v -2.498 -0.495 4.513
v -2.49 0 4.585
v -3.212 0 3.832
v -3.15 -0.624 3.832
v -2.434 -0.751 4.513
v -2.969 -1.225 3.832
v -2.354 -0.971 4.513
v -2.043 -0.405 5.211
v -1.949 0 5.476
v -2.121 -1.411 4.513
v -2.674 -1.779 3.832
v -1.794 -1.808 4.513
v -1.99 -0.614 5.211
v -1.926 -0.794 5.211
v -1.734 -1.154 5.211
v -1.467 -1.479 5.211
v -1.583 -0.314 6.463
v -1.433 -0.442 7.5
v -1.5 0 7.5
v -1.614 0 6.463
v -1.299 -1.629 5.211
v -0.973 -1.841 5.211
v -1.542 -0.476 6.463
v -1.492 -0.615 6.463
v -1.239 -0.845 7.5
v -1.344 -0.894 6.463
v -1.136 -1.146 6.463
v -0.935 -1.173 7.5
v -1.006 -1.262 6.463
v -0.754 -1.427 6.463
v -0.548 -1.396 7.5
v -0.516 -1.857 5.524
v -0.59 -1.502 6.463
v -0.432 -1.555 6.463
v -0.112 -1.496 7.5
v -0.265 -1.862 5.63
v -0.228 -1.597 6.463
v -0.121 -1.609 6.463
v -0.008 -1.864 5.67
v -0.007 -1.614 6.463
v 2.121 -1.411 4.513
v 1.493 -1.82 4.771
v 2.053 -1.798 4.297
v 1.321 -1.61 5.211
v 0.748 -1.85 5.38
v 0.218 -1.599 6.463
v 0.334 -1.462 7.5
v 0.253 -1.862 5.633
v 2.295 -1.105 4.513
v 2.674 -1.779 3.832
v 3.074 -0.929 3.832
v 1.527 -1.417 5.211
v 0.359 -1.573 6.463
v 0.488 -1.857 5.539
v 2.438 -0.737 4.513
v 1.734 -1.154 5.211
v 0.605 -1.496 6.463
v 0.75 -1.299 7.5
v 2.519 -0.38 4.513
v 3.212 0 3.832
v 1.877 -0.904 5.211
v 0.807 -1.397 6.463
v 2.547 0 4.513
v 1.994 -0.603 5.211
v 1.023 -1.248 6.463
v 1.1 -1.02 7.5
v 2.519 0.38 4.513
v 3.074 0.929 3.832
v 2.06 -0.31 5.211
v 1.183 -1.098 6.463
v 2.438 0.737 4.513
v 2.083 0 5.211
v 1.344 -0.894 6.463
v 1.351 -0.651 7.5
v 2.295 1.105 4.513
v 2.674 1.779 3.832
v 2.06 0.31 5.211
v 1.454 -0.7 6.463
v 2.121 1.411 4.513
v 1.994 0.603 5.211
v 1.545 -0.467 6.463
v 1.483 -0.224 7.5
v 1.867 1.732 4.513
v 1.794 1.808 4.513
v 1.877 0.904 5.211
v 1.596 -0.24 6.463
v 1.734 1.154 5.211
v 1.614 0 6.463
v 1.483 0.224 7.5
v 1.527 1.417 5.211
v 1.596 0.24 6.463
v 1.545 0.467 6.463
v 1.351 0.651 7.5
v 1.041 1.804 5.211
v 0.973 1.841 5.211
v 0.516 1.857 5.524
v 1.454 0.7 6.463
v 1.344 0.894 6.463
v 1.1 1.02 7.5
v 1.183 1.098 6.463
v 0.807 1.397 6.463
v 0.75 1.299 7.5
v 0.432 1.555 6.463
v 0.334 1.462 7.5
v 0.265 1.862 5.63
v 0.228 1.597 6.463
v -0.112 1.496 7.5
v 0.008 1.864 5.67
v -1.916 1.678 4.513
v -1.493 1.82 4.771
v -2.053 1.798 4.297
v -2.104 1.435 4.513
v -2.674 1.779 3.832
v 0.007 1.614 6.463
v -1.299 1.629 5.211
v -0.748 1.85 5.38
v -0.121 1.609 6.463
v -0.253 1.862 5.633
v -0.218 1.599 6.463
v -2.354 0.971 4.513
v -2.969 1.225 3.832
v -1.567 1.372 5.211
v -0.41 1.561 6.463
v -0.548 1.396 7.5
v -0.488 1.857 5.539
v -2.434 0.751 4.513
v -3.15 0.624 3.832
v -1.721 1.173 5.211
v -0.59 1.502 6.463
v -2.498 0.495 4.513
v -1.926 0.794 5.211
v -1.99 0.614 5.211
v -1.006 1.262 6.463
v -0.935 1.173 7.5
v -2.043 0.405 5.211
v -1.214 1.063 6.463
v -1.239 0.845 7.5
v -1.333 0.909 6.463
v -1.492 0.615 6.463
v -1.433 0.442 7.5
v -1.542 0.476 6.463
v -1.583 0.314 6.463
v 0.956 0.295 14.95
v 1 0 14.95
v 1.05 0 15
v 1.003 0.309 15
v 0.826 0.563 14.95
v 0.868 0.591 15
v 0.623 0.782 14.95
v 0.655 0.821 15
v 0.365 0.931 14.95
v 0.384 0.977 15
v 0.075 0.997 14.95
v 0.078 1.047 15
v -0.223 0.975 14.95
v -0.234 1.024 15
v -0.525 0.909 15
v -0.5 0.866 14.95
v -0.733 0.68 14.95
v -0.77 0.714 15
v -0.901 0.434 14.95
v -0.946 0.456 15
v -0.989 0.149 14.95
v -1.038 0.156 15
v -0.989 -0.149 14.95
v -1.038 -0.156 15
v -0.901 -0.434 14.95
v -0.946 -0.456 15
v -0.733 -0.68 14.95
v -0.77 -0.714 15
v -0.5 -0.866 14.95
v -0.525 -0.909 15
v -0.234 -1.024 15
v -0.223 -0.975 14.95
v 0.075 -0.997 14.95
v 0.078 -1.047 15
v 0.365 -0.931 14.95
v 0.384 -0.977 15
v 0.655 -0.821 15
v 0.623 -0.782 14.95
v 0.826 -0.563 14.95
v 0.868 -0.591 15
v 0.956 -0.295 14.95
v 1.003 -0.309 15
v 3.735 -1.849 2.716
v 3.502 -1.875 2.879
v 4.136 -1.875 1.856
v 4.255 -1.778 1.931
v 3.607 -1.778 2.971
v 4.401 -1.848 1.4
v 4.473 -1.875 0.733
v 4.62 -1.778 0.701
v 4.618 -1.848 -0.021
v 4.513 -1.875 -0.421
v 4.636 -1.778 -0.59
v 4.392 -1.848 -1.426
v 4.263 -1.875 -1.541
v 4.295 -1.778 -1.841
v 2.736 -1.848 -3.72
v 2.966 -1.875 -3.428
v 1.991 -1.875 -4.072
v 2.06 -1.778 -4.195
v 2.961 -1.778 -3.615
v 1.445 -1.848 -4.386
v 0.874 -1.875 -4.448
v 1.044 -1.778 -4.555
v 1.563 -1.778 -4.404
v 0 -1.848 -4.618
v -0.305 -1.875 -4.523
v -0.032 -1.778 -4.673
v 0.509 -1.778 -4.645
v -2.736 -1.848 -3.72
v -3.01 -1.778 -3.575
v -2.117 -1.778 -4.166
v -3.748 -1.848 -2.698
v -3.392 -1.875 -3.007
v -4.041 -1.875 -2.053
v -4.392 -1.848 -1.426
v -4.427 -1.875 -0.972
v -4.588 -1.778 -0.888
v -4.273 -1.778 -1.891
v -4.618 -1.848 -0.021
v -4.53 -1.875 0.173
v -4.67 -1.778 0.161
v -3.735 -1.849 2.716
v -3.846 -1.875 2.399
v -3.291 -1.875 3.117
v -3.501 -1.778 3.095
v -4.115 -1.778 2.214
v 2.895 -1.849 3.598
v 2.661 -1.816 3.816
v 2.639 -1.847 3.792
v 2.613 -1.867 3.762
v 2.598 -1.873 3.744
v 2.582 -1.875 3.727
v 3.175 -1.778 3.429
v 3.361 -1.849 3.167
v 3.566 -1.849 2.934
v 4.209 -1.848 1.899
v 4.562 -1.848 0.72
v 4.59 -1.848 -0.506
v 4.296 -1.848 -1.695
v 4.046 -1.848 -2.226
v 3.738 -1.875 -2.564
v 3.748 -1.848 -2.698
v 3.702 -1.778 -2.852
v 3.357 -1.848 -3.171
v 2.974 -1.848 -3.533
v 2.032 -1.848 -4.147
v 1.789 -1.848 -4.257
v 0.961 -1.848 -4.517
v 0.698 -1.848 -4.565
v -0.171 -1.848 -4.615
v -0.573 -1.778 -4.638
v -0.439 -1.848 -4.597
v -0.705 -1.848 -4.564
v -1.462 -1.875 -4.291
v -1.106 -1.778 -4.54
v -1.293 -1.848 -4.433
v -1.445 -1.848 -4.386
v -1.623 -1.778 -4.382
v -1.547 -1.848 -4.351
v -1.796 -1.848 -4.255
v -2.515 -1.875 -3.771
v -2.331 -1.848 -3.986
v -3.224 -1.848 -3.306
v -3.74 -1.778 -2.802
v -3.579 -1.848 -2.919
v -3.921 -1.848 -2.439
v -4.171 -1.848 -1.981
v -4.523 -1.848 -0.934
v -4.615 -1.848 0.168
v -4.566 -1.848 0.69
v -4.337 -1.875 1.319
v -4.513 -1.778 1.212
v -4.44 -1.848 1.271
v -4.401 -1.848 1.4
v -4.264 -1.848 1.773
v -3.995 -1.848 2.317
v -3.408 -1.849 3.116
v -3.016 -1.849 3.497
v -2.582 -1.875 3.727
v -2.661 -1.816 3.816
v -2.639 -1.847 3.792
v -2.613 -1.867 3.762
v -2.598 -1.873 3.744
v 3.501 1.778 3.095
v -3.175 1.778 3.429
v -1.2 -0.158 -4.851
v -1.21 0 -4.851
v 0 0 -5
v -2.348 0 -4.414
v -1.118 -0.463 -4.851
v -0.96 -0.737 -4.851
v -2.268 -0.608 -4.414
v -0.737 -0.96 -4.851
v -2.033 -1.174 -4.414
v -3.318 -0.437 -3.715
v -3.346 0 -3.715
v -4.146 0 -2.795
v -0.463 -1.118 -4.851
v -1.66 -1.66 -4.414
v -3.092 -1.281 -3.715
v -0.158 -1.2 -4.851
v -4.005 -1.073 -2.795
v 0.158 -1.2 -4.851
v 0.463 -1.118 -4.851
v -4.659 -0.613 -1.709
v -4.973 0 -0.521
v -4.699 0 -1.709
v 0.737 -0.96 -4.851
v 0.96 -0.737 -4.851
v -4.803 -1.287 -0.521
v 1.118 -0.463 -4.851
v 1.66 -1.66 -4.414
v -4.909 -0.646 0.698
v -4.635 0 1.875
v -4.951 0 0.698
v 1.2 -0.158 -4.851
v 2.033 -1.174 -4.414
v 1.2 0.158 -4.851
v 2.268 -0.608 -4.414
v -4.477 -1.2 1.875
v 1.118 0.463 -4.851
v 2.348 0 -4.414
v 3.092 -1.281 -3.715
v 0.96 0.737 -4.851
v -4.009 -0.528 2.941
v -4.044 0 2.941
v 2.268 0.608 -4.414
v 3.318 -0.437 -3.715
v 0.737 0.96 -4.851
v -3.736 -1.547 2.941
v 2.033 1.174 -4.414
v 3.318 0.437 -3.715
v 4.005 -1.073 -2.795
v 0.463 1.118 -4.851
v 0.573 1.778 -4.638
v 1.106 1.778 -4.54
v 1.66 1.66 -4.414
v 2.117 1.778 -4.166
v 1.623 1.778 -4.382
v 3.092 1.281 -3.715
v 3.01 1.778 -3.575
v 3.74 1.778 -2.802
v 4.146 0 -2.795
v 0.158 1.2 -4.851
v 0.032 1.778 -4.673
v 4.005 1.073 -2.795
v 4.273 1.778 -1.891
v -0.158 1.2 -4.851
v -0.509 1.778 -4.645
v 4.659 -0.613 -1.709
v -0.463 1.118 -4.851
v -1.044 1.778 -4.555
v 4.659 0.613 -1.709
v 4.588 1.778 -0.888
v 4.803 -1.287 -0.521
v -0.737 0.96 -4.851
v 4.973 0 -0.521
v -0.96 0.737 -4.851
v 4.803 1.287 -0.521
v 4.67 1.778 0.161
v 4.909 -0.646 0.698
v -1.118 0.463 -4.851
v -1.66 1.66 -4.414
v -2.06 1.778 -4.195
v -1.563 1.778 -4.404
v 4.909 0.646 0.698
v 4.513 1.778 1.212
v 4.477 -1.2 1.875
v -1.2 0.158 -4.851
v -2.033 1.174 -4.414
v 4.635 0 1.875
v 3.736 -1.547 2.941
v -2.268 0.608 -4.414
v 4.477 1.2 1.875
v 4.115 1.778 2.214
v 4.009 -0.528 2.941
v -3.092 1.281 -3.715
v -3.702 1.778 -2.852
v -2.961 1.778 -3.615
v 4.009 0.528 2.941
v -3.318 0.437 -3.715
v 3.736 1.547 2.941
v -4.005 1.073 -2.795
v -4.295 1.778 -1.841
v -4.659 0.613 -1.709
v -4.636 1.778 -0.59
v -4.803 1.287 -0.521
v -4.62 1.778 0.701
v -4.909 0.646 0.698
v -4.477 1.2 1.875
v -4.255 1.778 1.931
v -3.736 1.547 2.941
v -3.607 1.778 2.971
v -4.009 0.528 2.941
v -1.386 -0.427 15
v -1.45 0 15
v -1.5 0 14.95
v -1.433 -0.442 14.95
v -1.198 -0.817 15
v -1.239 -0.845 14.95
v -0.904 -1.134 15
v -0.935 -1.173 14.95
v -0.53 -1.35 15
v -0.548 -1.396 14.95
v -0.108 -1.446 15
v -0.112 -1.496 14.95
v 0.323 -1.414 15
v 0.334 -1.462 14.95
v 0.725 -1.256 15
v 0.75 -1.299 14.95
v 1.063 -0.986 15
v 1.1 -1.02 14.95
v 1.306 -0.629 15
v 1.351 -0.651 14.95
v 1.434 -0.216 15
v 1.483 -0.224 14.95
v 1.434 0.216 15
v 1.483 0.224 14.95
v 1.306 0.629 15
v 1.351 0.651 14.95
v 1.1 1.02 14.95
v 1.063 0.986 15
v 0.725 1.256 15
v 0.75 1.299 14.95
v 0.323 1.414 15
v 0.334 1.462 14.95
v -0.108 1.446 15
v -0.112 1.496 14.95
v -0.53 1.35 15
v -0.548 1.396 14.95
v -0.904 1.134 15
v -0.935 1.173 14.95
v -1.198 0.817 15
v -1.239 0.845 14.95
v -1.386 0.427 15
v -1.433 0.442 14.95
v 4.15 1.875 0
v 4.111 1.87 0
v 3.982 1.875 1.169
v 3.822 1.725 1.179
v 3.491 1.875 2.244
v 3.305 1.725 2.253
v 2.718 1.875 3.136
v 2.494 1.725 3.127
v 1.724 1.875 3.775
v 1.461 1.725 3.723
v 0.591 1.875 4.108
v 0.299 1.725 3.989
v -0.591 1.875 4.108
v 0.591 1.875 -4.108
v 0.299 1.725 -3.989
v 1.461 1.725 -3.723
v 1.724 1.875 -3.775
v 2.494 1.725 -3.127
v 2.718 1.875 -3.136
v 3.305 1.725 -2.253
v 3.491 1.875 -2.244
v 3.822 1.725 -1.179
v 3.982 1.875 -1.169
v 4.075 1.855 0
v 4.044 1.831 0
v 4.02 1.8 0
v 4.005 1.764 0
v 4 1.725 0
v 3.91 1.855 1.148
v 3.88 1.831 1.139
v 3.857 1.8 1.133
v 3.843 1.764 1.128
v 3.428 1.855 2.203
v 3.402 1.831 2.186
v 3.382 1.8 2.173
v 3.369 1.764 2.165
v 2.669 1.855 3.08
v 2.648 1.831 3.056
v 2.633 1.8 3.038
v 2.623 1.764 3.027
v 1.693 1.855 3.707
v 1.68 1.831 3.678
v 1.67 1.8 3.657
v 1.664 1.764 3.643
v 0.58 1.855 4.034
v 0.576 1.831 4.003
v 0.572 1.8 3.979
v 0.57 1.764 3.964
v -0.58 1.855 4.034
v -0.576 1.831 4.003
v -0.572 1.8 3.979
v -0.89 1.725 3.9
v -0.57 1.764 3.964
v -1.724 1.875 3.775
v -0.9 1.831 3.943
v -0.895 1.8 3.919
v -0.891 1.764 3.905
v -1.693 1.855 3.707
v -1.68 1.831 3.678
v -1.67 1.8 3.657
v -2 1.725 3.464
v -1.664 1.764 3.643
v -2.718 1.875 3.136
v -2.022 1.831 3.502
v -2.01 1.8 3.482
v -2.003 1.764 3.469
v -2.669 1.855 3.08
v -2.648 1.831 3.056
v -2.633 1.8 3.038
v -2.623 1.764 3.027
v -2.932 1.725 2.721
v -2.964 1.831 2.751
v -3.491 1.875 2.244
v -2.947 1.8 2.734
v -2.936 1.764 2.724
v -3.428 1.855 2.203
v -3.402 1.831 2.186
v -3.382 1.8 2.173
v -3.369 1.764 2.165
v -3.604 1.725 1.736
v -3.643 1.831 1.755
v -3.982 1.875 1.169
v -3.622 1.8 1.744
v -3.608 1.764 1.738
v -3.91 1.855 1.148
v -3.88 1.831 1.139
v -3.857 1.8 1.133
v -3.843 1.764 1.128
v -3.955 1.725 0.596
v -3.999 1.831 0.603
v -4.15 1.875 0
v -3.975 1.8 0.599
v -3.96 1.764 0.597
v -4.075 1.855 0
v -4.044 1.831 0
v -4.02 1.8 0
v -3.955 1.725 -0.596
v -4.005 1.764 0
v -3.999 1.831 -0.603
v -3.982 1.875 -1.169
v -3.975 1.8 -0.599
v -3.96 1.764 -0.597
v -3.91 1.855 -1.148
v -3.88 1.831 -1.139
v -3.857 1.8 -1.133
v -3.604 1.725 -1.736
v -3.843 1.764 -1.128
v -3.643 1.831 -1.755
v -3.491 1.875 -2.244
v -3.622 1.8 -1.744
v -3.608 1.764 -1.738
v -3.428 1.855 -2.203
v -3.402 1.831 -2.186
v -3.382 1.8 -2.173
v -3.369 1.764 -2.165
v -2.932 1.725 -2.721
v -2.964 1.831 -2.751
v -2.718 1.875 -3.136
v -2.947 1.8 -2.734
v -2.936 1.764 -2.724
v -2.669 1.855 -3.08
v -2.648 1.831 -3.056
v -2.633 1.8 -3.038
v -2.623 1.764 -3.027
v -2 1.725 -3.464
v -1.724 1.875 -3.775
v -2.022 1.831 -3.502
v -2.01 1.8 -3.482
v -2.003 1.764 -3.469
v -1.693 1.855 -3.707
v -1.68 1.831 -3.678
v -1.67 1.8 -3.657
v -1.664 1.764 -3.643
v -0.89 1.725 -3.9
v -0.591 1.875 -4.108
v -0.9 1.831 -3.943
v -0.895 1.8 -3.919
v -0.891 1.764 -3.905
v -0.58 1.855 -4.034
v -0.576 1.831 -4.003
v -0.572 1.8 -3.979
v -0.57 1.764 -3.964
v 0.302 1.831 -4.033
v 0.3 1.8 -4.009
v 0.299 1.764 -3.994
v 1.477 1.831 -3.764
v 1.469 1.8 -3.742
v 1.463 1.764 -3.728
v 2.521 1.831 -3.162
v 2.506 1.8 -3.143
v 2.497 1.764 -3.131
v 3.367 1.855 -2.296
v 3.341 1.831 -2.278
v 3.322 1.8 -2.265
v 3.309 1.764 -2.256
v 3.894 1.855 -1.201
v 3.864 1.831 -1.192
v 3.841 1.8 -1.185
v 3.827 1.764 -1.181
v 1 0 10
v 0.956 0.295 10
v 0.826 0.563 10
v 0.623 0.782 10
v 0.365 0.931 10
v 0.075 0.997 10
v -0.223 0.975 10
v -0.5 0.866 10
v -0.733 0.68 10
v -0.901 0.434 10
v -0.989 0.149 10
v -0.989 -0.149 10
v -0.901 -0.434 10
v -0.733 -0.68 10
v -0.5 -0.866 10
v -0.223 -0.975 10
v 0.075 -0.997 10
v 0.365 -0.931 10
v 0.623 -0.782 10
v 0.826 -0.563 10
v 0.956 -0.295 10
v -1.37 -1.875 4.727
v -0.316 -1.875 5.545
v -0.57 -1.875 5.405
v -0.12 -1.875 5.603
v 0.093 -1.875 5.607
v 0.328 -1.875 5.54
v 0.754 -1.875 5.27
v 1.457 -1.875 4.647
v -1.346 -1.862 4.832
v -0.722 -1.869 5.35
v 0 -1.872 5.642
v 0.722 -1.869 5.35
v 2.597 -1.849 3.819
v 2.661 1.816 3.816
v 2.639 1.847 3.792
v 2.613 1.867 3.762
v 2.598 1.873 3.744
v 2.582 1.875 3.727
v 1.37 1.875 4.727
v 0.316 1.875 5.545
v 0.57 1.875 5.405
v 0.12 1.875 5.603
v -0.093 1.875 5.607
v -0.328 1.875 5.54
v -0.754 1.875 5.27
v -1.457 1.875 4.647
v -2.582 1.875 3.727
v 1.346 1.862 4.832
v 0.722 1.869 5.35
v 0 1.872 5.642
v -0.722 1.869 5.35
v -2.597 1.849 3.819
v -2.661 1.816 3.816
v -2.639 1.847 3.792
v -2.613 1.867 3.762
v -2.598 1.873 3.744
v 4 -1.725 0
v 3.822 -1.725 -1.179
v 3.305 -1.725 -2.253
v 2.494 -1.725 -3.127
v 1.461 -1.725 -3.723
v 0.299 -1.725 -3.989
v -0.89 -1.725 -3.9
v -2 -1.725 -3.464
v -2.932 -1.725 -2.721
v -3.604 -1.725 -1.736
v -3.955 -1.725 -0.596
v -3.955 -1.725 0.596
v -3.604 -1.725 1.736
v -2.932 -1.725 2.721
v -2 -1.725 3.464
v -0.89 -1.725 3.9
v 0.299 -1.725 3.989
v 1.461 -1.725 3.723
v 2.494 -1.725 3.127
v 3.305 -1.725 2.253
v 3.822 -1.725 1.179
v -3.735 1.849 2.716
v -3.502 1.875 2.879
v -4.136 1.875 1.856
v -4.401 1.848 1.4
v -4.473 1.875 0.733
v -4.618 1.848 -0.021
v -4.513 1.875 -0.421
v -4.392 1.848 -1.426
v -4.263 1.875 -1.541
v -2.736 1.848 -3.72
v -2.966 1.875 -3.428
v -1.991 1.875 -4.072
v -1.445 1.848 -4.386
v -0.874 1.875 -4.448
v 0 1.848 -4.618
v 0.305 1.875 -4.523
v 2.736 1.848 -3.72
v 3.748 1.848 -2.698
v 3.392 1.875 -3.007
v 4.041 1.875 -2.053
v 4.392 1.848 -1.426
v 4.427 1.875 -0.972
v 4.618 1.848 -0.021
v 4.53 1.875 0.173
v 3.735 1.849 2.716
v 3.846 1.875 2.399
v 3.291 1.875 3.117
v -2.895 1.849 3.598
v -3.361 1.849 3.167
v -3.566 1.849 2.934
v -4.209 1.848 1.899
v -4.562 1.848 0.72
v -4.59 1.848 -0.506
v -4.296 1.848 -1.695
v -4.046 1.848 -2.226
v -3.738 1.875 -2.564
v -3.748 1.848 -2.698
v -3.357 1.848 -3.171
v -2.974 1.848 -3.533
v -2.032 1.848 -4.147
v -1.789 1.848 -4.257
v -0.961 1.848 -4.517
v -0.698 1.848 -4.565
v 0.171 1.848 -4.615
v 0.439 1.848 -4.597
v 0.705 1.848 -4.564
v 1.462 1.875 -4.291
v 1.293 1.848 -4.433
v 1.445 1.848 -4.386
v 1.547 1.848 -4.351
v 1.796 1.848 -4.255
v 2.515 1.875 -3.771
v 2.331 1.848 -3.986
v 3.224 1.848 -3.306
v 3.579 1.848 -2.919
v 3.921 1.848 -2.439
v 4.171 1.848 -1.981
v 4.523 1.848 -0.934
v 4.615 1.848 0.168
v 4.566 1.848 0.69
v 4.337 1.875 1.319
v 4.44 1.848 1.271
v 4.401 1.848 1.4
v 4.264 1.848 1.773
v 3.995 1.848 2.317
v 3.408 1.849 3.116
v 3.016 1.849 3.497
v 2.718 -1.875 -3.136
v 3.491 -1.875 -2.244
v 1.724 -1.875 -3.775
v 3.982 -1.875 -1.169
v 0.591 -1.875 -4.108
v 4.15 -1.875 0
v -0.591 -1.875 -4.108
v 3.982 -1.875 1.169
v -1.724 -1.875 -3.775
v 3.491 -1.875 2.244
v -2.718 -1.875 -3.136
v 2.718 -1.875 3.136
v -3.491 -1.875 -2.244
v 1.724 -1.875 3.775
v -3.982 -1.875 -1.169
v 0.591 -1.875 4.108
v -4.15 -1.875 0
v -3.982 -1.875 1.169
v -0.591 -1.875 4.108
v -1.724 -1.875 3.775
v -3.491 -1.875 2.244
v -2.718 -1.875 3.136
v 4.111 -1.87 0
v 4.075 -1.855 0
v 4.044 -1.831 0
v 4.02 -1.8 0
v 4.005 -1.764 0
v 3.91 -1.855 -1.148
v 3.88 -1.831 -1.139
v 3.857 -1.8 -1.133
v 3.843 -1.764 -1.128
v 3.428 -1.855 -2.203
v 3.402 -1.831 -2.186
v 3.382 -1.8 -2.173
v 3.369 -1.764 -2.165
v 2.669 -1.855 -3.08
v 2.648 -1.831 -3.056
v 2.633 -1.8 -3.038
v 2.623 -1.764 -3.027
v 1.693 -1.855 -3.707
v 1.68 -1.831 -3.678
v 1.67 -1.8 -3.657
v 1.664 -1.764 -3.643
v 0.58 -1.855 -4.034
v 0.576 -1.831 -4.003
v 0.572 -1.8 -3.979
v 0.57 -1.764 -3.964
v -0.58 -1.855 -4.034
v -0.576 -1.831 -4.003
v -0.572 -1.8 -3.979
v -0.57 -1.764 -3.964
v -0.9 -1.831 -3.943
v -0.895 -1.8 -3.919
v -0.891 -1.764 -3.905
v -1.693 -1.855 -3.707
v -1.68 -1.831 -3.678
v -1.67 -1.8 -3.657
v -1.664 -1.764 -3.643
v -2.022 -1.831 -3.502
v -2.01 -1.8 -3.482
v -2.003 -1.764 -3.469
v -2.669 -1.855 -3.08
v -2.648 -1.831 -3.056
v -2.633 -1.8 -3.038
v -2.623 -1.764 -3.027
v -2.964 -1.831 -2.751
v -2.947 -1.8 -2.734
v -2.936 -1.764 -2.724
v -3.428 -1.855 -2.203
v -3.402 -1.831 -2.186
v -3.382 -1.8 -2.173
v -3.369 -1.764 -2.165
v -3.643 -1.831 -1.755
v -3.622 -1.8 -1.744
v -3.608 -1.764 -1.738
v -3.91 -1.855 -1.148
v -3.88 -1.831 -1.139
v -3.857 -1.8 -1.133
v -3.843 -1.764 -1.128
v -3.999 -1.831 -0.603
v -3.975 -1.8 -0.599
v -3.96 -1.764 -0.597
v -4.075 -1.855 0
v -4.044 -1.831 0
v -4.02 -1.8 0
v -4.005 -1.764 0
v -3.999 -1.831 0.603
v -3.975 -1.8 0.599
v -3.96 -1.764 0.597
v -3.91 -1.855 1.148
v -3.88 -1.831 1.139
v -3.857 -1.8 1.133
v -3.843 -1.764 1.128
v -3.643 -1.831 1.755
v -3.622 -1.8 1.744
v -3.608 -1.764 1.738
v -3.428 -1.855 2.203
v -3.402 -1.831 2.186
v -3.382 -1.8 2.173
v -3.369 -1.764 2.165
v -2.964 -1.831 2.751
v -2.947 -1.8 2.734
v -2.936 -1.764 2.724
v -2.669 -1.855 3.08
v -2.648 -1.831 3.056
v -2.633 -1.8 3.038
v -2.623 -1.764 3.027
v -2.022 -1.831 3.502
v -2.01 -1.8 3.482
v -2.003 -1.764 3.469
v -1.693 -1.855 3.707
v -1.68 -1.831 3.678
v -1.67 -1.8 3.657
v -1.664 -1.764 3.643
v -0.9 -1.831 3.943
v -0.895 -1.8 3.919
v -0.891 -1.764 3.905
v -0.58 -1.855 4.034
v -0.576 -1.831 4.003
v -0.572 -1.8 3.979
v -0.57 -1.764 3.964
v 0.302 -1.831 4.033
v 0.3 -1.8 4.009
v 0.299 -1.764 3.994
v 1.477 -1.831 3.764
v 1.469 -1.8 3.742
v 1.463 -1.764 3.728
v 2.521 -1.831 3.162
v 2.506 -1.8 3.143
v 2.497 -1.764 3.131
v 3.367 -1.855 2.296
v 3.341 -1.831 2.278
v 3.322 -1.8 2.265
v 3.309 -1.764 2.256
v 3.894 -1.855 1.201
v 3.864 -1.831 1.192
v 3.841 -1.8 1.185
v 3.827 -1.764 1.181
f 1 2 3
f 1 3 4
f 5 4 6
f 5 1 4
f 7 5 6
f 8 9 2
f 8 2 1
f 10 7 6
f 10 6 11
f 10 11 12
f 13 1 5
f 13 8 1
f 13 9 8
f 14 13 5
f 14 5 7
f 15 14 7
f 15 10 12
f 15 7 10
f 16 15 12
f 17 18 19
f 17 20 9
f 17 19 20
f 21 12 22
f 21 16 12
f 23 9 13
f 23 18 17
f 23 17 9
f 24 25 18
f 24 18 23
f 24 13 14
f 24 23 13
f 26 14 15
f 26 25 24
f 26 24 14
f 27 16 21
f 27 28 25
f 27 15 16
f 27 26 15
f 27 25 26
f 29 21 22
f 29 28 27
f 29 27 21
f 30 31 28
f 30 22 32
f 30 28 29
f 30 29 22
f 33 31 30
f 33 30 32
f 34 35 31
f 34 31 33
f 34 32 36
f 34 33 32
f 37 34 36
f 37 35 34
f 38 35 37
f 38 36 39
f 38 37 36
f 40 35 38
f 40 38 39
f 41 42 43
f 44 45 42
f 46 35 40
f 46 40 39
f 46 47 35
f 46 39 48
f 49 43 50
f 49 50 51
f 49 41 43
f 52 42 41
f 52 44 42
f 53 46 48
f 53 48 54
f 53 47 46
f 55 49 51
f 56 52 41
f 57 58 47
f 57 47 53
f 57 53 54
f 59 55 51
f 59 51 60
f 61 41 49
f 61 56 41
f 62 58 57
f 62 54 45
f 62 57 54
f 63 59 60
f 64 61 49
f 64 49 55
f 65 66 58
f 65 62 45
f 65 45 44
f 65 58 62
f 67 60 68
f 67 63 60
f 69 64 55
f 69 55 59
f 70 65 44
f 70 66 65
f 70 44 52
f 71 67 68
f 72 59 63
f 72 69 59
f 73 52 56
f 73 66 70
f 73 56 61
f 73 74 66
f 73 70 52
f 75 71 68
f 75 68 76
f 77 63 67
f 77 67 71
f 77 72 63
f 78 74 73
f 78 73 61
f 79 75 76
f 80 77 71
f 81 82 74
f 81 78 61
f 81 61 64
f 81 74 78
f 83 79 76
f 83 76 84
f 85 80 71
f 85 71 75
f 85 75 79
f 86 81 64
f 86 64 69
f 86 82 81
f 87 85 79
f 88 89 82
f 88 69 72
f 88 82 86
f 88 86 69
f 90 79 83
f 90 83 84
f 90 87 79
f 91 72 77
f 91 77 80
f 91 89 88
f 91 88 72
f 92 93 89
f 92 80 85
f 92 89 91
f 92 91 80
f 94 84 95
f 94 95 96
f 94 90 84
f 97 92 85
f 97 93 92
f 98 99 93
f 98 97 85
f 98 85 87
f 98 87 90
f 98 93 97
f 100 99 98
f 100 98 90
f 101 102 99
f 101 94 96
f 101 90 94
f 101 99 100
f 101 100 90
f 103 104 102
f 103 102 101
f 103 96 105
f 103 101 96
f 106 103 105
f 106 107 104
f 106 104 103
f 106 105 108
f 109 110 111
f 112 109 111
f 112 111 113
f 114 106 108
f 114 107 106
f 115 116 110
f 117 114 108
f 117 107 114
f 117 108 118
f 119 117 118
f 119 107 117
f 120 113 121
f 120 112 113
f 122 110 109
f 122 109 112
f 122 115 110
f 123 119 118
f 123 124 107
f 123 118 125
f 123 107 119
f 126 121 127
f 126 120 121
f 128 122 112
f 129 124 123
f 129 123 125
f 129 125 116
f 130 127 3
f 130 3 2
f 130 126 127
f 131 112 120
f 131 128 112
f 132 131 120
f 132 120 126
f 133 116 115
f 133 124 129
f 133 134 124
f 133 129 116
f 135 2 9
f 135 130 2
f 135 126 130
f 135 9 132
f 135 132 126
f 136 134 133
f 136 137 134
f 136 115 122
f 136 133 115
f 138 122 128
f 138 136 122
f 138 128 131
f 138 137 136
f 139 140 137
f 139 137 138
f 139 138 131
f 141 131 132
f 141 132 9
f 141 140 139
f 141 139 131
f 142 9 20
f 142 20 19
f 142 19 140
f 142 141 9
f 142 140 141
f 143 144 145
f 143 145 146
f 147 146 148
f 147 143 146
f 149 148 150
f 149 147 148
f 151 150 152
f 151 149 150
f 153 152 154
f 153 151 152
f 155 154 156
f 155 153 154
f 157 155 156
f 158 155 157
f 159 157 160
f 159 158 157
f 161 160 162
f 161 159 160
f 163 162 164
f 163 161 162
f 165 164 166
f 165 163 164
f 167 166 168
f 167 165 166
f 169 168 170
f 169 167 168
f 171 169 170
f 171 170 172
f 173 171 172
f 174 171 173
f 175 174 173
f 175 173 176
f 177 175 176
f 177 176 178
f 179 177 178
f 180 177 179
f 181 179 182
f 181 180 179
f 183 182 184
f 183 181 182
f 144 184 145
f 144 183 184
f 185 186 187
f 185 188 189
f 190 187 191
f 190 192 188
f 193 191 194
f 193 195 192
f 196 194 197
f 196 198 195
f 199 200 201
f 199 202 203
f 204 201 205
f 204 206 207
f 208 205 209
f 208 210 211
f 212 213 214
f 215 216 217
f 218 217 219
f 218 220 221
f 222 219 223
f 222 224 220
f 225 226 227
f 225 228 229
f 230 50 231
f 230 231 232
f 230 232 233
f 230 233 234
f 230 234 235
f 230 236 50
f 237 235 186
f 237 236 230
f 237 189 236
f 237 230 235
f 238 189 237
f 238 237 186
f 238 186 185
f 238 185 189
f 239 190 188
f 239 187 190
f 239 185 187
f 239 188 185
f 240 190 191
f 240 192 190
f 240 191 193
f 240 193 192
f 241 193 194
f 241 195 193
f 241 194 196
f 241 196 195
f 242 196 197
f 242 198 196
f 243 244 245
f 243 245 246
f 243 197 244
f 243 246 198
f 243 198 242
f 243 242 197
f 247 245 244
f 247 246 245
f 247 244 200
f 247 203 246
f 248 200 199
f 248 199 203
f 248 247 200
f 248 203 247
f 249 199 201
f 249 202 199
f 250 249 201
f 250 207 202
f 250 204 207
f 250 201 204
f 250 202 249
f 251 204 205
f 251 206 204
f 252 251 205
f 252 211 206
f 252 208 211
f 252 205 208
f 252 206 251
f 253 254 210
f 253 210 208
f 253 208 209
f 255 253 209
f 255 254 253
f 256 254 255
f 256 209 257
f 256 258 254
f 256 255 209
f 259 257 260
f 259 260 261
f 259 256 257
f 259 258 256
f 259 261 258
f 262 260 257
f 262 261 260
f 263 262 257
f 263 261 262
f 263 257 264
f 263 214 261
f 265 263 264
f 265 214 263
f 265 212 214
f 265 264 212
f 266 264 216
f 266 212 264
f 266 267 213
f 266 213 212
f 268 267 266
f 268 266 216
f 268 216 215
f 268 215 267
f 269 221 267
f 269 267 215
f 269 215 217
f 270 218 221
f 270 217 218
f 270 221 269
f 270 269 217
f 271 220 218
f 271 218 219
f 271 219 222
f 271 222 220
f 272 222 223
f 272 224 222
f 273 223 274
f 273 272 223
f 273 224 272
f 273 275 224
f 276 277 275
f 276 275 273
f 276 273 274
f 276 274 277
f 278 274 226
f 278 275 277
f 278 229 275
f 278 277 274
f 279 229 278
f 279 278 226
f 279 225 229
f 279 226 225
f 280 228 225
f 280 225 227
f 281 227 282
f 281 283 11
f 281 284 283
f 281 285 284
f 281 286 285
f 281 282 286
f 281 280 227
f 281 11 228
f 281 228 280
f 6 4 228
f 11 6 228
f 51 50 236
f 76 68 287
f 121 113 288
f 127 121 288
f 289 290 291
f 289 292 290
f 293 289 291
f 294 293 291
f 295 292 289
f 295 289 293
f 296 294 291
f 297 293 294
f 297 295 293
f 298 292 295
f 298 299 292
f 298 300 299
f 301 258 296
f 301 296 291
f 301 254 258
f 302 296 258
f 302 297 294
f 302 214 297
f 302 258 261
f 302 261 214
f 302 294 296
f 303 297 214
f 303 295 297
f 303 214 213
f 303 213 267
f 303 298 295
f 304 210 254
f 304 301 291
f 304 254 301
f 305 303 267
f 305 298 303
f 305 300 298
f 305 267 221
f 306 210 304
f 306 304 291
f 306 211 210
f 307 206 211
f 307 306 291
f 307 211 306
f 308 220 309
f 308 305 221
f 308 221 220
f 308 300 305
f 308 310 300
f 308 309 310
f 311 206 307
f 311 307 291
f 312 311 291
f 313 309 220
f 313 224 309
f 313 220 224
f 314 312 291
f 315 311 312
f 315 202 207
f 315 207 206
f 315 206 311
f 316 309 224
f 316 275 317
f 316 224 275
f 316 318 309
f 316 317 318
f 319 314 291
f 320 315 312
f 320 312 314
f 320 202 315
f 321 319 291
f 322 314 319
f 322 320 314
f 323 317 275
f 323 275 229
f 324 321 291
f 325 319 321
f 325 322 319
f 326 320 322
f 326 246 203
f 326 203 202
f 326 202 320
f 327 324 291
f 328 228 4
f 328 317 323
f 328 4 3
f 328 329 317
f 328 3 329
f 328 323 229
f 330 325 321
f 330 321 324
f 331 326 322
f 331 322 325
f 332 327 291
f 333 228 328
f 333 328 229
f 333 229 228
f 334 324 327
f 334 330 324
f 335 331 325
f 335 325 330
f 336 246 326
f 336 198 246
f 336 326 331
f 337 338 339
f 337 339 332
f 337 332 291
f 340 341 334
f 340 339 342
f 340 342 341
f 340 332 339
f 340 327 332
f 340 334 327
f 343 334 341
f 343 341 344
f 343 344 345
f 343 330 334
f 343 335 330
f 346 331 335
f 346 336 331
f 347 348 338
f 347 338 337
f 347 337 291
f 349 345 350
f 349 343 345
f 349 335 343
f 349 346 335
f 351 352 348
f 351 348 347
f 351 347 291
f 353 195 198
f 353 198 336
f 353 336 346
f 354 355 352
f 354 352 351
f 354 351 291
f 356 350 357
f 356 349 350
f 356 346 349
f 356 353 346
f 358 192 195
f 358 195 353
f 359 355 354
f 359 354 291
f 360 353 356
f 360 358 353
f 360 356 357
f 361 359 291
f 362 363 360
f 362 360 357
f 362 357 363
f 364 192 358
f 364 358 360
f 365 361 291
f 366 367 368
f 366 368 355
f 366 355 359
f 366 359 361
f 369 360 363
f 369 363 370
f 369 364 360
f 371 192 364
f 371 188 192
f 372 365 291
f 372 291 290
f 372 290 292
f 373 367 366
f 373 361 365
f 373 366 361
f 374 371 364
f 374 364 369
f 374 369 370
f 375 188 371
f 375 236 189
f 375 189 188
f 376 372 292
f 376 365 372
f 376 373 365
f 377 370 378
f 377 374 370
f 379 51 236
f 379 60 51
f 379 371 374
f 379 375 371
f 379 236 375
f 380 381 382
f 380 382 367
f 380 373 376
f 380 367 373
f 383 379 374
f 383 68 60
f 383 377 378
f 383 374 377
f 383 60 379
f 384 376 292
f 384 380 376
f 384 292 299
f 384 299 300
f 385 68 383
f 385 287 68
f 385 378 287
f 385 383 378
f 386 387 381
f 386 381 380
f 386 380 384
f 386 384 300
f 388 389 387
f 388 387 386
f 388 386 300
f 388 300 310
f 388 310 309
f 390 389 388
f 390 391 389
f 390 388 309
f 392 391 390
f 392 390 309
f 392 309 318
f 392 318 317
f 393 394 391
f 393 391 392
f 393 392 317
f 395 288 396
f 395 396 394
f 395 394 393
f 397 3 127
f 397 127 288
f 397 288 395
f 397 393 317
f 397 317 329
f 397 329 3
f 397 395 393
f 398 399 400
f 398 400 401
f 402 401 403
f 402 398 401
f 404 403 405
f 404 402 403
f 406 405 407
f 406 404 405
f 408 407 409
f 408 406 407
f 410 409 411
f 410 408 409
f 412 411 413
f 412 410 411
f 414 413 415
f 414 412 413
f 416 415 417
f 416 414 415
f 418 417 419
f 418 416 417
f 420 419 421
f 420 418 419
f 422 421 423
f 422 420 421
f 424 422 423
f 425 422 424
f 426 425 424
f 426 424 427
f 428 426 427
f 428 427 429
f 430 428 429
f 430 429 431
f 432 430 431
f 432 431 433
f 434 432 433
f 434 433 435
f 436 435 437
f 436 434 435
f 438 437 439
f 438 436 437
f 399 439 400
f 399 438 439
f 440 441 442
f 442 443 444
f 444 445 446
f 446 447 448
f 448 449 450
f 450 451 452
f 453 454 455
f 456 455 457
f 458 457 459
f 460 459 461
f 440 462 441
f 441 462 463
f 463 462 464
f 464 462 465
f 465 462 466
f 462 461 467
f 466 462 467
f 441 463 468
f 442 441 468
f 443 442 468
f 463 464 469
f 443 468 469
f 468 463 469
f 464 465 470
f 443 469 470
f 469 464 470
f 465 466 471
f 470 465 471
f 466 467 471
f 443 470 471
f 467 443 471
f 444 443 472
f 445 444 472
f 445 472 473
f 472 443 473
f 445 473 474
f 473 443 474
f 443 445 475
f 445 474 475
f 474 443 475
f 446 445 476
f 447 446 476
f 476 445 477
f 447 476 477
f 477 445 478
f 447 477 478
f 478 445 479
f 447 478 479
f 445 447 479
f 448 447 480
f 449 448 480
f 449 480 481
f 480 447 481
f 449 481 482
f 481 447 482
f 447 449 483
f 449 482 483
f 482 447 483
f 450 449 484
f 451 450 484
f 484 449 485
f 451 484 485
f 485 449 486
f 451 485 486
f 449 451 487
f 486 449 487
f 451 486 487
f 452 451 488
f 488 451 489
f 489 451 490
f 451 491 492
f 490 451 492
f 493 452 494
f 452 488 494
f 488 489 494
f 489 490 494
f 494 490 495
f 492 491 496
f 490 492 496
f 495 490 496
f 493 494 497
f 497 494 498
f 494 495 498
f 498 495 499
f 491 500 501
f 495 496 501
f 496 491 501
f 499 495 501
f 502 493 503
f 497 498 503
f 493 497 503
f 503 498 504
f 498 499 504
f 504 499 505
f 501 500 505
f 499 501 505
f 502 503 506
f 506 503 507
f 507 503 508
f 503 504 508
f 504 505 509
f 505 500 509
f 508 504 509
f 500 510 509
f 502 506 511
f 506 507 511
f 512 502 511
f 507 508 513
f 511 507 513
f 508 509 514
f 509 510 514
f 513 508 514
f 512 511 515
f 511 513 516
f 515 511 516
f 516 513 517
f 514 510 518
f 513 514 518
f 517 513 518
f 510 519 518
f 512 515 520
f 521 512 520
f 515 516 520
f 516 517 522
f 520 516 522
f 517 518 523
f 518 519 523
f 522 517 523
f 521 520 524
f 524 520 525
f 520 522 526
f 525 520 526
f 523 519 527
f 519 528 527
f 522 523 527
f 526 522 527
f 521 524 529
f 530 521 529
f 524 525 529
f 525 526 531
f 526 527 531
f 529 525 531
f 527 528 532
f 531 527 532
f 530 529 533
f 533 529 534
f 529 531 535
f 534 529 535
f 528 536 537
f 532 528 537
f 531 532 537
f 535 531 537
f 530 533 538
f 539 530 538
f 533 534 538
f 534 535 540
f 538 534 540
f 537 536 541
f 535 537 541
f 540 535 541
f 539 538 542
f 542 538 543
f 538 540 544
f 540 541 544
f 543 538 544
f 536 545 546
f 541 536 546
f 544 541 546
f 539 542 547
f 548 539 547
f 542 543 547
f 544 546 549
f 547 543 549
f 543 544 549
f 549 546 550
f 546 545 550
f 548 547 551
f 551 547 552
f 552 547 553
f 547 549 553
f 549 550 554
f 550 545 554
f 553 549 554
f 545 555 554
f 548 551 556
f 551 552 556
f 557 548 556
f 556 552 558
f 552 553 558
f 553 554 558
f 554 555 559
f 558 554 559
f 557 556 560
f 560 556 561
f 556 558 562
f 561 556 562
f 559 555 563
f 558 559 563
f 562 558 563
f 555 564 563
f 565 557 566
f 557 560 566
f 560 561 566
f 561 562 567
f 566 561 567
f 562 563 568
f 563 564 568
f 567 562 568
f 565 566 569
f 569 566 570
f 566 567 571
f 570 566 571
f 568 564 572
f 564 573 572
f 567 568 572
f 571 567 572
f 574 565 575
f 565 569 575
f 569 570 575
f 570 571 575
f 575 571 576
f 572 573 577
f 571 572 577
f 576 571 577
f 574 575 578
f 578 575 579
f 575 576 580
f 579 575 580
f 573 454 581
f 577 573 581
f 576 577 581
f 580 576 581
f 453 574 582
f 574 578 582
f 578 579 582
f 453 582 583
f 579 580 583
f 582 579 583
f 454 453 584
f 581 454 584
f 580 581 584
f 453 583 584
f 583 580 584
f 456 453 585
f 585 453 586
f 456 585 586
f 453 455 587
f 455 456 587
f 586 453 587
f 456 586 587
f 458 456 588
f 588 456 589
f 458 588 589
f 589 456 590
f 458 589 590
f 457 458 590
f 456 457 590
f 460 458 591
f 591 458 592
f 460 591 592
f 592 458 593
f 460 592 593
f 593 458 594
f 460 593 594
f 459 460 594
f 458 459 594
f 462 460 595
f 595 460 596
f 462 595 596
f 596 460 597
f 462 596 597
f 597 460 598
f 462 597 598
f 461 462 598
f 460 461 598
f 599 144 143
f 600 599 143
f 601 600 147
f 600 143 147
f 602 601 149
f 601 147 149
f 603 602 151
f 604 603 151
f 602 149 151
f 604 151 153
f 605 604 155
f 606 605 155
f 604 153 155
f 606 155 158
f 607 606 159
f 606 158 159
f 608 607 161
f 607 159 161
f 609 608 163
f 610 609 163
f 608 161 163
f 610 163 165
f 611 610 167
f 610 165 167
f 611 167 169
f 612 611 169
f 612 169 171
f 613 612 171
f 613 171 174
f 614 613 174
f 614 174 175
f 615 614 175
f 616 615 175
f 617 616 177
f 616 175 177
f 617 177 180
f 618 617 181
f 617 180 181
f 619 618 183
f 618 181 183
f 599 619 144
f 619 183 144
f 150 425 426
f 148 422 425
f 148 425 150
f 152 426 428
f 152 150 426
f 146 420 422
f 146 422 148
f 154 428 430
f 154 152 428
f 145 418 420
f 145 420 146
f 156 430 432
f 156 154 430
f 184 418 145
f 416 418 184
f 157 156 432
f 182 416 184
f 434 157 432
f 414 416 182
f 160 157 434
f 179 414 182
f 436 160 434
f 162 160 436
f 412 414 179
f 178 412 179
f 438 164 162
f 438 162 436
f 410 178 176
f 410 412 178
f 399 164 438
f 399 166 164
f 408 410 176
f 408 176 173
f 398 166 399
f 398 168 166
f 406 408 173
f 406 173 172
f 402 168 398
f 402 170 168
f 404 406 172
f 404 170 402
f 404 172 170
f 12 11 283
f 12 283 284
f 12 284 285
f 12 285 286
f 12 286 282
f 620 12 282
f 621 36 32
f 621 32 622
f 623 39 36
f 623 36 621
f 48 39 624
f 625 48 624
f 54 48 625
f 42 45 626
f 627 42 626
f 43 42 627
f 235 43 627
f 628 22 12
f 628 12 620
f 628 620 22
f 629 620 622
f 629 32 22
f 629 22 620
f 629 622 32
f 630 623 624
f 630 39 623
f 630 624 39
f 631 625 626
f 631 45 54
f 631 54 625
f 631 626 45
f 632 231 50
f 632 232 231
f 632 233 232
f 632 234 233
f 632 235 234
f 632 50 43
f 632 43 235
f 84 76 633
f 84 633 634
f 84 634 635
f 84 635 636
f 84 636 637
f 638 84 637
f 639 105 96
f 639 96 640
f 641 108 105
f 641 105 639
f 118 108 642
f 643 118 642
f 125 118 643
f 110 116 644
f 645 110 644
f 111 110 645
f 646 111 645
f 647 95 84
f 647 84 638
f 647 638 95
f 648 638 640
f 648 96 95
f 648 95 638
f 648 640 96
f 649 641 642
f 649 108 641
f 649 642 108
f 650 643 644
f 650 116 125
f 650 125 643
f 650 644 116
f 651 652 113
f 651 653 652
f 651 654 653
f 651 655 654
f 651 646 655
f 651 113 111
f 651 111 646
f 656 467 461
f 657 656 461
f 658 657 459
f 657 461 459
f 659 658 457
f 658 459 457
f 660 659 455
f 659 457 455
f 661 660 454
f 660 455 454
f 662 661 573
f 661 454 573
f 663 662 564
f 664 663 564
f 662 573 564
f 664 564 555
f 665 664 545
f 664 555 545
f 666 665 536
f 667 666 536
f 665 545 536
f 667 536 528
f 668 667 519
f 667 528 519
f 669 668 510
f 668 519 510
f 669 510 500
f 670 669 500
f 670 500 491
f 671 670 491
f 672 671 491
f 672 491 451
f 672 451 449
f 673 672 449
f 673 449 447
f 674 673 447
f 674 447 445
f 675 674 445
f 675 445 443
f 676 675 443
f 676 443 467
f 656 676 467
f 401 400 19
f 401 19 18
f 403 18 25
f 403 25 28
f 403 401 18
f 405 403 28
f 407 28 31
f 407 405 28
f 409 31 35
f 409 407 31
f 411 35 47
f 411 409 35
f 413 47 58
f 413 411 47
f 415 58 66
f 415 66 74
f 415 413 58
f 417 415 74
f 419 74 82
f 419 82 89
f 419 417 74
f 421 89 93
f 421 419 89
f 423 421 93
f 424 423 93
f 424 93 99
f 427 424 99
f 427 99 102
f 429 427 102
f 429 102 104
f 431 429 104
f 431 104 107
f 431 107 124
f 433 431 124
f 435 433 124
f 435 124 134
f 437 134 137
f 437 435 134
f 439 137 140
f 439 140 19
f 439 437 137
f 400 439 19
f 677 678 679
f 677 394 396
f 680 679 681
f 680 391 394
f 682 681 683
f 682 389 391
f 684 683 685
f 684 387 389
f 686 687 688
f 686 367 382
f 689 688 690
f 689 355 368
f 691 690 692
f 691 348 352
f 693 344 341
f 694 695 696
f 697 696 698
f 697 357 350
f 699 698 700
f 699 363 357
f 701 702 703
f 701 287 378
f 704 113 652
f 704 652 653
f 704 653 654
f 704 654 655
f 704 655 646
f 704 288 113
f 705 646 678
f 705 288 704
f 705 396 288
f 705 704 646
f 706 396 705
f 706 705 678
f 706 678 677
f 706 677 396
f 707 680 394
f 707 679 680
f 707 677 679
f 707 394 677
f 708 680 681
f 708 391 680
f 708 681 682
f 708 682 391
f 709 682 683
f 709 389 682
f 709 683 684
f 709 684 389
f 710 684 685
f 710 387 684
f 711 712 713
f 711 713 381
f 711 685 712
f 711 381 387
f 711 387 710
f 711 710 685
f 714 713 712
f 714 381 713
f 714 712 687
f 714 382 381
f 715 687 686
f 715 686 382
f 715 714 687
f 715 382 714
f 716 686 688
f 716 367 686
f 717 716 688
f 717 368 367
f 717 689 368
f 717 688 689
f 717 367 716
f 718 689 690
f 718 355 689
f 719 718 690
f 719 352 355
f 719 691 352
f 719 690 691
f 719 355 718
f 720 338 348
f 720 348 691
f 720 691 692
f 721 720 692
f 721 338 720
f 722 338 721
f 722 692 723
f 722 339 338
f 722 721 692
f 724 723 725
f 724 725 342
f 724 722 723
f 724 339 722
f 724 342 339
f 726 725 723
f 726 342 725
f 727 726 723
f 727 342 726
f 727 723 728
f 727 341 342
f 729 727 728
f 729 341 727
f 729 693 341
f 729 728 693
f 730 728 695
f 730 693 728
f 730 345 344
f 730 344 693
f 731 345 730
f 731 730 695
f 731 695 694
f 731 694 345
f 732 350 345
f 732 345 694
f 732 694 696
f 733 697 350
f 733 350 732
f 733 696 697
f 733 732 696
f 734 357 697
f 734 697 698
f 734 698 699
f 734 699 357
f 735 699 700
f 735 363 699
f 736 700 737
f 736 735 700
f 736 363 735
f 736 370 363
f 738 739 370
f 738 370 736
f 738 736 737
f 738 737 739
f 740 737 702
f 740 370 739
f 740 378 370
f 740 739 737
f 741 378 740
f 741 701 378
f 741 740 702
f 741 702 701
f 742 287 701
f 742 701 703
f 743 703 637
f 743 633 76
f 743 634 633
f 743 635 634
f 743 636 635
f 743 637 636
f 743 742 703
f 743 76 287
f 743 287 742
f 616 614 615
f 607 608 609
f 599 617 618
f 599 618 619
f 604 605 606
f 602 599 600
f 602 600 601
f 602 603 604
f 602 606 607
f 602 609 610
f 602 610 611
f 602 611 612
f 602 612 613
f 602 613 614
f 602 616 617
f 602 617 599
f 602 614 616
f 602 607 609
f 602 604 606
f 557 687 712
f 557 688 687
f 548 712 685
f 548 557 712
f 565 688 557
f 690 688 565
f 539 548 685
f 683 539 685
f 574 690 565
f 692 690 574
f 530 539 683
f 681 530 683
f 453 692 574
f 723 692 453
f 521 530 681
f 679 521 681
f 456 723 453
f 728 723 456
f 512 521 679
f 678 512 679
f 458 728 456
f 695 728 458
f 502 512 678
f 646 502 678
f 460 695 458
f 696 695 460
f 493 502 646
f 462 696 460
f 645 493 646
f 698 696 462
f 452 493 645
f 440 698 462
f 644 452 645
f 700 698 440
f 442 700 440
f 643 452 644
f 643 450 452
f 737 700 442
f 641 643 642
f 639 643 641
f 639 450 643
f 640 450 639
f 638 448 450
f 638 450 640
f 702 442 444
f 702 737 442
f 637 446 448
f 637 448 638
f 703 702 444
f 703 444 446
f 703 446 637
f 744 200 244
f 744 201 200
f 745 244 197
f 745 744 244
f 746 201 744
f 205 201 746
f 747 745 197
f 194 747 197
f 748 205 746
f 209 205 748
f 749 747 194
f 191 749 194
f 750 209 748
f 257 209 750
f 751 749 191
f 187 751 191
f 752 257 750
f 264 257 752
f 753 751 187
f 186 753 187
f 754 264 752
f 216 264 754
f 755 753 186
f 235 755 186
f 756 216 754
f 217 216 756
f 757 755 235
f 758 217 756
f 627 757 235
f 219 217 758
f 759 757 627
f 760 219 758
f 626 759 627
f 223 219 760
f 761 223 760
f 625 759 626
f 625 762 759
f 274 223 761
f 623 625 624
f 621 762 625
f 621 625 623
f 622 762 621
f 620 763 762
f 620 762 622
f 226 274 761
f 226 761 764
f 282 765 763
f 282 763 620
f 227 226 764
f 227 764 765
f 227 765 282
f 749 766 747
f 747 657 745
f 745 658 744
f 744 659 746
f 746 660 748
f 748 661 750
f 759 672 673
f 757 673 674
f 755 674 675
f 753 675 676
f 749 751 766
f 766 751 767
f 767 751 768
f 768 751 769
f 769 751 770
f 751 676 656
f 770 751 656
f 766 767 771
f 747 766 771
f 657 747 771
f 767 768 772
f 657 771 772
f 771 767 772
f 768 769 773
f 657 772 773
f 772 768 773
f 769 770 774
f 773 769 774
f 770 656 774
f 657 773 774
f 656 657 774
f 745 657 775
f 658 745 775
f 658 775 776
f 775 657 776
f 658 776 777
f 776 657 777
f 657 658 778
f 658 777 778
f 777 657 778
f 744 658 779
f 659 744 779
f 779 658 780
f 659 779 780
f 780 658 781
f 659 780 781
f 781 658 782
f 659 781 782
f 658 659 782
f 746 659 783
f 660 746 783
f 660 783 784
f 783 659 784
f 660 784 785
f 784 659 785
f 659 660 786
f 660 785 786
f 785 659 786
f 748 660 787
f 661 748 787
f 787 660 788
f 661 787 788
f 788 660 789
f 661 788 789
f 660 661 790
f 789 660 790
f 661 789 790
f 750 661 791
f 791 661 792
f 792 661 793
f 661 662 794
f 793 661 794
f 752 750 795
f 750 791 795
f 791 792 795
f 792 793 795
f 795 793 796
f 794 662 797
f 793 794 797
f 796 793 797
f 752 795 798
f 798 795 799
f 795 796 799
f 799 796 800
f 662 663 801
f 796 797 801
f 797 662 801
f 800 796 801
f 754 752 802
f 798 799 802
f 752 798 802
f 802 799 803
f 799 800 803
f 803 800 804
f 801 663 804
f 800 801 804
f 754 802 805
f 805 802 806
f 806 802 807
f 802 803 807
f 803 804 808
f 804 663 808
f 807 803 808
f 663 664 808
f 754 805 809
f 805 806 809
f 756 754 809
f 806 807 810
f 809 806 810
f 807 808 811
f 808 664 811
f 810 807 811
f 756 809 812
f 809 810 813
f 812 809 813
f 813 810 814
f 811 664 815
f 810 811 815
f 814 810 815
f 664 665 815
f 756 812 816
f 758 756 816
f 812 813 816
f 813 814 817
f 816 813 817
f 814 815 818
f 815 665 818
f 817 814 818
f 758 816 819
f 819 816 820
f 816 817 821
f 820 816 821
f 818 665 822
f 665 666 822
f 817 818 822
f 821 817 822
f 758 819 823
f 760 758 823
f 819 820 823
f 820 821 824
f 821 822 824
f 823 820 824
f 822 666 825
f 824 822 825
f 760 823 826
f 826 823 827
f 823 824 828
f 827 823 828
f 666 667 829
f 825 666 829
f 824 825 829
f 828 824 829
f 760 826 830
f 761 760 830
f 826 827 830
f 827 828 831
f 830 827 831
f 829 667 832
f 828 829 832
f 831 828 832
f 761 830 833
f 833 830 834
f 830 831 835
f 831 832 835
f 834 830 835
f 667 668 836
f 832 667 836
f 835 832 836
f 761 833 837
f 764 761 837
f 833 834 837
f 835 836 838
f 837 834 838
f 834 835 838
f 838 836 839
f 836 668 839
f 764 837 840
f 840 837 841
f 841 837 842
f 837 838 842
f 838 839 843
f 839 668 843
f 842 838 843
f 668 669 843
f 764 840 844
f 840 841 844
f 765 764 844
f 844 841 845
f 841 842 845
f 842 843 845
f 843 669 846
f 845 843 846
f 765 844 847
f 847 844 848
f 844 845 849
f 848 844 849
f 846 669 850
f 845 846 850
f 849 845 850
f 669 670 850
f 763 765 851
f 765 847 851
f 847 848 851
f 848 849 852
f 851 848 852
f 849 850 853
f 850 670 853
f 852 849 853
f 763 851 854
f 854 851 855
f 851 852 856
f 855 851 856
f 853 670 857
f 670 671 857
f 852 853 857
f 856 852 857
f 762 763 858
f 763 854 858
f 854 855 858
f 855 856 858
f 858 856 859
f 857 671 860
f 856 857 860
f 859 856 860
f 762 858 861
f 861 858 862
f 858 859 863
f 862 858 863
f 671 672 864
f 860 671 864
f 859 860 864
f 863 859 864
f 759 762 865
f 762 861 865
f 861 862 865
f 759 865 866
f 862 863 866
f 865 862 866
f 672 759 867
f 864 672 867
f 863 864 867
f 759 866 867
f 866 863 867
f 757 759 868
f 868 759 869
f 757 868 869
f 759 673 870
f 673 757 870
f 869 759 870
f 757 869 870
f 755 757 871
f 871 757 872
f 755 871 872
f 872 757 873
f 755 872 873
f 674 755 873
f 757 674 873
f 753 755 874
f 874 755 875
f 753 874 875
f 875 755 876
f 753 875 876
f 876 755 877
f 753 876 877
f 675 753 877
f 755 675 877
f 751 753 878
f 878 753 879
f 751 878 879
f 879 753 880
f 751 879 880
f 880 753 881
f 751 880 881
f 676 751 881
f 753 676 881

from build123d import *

# Parameters (mm, degrees)
CUT_EXTRUDE1_DEPTH      = 10
CUT_EXTRUDE1_DEPTH_BACK = 10
SKETCH5_R               = 4
CUT_EXTRUDE2_DEPTH      = 10
CUT_EXTRUDE2_DEPTH_BACK = 10
FILLET1_R               = 0.15
FILLET2_R               = 0.15
SKETCH6_R               = 1
CUT_EXTRUDE3_DEPTH      = 5
CHAMFER1_SIZE           = 0.05


with BuildPart() as part:
    # Sketch2 → Revolve1 (revolve)
    with BuildSketch(Plane(origin=(0, 0, 0), x_dir=(1, 0, 0), z_dir=(0, 1, 0))):
        with BuildLine():
            Line((-1.5, -15), (0, -15))
            Line((0, -15), (0, 5))
            ThreePointArc((0, 5), (-4.698967117, 1.708715315), (-3.211678832, -3.832116788))
            ThreePointArc((-3.211678832, -3.832116788), (-1.948980687, -5.476190987), (-1.5, -7.5))
            Line((-1.5, -7.5), (-1.5, -15))
        make_face()
    revolve(axis=Axis((0, 0, -5), (0, 0, 1)))

    # Sketch4 → Cut-Extrude1 (cut, two sides)
    with BuildSketch(Plane(origin=(0, 0, 0), x_dir=(0, 0, -1), z_dir=(1, 0, 0))) as cut_extrude1_sk:
        with BuildLine():
            Line((-21.365147595, 11.777353688), (10.763184779, 11.777353688))
            Line((10.763184779, 11.777353688), (10.763184779, 1.875))
            Line((10.763184779, 1.875), (-5.64662697, 1.875))
            ThreePointArc((-5.64662697, 1.875), (-7.150155967, 2.106415246), (-8.514509151, 2.779239779))
            Line((-8.514509151, 2.779239779), (-21.365147595, 11.777353688))
        make_face()
        with BuildLine():
            Line((-8.514509151, -2.779239779), (-21.365147595, -11.777353688))
            Line((-21.365147595, -11.777353688), (10.763184779, -11.777353688))
            Line((10.763184779, -11.777353688), (10.763184779, -1.875))
            Line((10.763184779, -1.875), (-5.64662697, -1.875))
            ThreePointArc((-5.64662697, -1.875), (-7.150155967, -2.106415246), (-8.514509151, -2.779239779))
        make_face()
    extrude(amount=CUT_EXTRUDE1_DEPTH, mode=Mode.SUBTRACT)
    extrude(cut_extrude1_sk.sketch, amount=-CUT_EXTRUDE1_DEPTH_BACK, mode=Mode.SUBTRACT)

    # Sketch5 → Cut-Extrude2 (cut, two sides)
    with BuildSketch(Plane(origin=(0, 0, 0), x_dir=(1, 0, 0), z_dir=(0, 1, 0))) as cut_extrude2_sk:
        Circle(SKETCH5_R)
    extrude(amount=CUT_EXTRUDE2_DEPTH, mode=Mode.SUBTRACT)
    extrude(cut_extrude2_sk.sketch, amount=-CUT_EXTRUDE2_DEPTH_BACK, mode=Mode.SUBTRACT)

    # Fillet1
    fillet1_edges = [part.edges().sort_by_distance(p)[0] for p in [
        (1e-09, -1.875, 5.642942998),
        (-1e-09, 1.875, 5.642942998),
        (0, 1.875, -4.635124054),
        (0, -1.875, -4.635124054),
        (-4, 1.875, 0),
    ]]
    fillet(fillet1_edges, radius=FILLET1_R)

    # Fillet2
    fillet2_edges = [part.edges().sort_by_distance(p)[0] for p in [
        (-4, -1.875, 0),
    ]]
    fillet(fillet2_edges, radius=FILLET2_R)

    # Sketch6 → Cut-Extrude3 (cut)
    with BuildSketch(Plane.XY.offset(15)):
        Circle(SKETCH6_R)
    extrude(amount=-CUT_EXTRUDE3_DEPTH, mode=Mode.SUBTRACT)

    # Chamfer1
    chamfer1_edges = [part.edges().sort_by_distance(p)[0] for p in [
        (1.5, 0, 15),
        (-1, 0, 15),
    ]]
    chamfer(chamfer1_edges, length=CHAMFER1_SIZE)


solid = part.part
